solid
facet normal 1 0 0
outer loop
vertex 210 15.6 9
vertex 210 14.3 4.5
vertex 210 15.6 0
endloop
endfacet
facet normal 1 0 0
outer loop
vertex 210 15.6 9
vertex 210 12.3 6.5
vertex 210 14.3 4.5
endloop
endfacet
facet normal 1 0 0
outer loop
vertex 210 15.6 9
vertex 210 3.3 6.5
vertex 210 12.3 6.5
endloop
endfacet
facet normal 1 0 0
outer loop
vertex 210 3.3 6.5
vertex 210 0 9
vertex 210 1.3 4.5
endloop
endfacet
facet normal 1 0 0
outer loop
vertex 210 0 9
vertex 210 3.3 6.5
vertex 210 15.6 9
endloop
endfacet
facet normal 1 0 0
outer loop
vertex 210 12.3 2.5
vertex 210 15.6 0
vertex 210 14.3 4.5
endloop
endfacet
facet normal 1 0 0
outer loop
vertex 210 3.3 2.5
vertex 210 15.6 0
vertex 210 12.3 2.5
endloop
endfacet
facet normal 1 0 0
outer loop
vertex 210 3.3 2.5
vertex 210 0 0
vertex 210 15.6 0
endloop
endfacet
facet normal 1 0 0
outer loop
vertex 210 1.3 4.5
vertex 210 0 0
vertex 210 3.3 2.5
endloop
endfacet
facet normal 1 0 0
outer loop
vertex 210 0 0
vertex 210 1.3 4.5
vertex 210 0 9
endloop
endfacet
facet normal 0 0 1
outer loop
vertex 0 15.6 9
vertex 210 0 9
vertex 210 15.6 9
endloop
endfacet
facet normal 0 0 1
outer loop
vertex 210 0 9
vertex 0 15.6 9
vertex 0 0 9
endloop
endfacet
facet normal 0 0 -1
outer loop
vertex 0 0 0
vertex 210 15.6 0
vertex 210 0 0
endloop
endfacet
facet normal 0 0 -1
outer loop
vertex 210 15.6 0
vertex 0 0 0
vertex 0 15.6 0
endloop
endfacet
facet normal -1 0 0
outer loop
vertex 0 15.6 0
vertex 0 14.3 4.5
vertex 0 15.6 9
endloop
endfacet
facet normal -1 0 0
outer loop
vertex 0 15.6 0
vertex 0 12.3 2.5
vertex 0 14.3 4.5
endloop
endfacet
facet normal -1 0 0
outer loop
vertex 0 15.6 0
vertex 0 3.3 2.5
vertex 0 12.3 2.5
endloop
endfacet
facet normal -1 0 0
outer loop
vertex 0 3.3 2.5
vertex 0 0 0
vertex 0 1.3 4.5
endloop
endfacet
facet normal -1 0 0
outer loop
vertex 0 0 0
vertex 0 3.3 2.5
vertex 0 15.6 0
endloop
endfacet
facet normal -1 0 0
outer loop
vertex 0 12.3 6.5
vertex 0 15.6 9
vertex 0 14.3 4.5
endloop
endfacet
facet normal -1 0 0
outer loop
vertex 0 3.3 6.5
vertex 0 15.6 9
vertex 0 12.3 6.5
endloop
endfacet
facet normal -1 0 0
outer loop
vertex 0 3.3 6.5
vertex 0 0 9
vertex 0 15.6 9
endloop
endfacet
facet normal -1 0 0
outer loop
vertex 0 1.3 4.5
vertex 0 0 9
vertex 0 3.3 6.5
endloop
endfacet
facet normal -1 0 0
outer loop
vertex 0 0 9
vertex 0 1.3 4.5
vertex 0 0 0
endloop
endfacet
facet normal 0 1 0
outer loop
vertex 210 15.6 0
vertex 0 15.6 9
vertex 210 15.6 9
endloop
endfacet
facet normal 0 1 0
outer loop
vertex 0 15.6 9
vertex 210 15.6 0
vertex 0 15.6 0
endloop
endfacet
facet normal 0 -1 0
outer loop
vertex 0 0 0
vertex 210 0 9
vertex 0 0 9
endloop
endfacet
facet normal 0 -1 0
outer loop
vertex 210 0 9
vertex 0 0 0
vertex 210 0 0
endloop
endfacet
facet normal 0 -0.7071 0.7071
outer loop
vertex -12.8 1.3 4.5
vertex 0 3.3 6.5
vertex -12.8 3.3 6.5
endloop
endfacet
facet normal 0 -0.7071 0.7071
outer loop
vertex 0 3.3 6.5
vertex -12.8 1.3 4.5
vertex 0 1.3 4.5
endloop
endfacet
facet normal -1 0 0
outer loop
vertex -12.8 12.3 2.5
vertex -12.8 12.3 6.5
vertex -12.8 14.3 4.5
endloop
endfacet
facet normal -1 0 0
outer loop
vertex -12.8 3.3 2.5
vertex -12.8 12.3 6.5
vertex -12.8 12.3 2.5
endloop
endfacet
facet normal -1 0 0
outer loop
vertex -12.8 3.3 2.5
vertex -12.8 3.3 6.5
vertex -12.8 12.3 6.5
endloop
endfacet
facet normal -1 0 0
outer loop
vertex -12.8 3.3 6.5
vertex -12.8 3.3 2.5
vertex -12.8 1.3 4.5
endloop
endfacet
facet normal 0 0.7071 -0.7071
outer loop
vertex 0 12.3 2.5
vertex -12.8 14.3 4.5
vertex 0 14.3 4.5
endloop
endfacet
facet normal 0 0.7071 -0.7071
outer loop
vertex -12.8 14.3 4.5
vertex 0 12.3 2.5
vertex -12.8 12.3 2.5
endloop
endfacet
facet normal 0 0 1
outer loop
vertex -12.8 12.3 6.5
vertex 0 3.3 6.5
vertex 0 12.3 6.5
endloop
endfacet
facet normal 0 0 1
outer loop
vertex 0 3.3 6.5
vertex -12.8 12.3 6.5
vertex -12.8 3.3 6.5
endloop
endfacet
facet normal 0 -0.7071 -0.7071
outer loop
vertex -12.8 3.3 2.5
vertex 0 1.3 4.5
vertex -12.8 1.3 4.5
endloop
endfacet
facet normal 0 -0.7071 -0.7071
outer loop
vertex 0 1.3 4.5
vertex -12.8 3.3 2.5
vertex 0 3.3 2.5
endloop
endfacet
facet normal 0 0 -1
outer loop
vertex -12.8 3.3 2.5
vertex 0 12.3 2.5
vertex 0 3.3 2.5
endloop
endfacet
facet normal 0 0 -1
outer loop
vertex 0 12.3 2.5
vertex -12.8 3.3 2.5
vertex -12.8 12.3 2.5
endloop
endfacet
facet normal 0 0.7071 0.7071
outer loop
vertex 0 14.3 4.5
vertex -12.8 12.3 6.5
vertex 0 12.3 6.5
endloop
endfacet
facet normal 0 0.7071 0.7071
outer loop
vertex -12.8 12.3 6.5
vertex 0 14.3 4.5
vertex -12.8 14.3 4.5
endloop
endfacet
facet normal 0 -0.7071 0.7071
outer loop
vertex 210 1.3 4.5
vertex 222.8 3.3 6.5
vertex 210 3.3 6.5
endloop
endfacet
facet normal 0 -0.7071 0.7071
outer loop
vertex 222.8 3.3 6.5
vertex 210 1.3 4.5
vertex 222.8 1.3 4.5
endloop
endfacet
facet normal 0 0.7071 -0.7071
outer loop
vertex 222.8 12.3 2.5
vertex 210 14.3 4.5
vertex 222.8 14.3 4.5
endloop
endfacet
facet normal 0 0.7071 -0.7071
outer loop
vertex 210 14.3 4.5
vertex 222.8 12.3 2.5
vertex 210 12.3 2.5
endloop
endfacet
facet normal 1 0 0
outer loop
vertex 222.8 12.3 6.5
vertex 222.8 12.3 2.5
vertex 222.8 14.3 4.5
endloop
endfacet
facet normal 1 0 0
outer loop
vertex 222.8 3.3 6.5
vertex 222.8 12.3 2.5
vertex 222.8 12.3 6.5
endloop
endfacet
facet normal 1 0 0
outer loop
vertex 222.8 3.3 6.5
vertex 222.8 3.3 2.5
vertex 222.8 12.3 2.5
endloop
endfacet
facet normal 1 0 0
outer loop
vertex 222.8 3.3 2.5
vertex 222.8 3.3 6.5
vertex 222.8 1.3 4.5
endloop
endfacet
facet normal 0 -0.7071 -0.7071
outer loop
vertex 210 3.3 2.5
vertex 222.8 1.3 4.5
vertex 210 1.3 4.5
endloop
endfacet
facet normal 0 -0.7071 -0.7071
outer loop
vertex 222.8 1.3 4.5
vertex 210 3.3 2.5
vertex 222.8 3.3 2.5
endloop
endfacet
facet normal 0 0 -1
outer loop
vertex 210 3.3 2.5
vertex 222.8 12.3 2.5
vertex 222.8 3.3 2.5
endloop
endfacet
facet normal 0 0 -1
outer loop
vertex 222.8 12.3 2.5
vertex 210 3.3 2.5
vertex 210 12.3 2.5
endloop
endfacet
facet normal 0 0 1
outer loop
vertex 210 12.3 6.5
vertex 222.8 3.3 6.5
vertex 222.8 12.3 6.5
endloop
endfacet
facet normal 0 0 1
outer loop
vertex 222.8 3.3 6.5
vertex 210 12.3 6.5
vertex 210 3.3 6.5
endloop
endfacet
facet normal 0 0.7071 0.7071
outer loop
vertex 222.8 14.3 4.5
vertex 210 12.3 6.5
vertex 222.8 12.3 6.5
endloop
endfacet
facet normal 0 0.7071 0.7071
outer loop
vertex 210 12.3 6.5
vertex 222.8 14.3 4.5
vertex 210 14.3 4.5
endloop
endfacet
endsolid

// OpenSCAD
X=210;//mm;
Z = 9;
Y=15.6;

x=12.8;
y=13;
z=4;


module xxx(){
    translate([-x,(Y-y)/2,(Z-z)/2 +z])
    rotate([90,0,90])
    linear_extrude(height=x)
    polygon([[0,-2],[2,0],[y-2,0],[y,-2],[y-2,-z],[2,-z],[0,-2]]);
}

cube([X, Y, Z]);
xxx();
translate([X+x,0,0])
xxx();
